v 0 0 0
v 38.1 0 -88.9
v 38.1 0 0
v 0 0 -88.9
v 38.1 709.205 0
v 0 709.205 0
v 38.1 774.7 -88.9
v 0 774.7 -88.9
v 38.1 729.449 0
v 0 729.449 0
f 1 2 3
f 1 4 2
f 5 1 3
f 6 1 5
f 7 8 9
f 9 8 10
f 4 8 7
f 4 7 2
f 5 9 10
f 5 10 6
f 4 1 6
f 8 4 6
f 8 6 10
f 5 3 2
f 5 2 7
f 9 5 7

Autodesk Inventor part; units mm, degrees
ref_plane "YZ Plane" through (0, 0, 0) normal (1, 0, 0) x (0, 1, 0)
ref_plane "XZ Plane" through (0, 0, 0) normal (0, 1, 0) x (-1, 0, 0)
ref_plane "XY Plane" through (0, 0, 0) normal (0, 0, 1) x (1, 0, 0)
sketch "Sketch1" plane through (0, 0, 0) normal (1, 0, 0) x (0, 1, 0)
  line L0 (0, 0) -> (709.2052, 0)
  line L1 (774.7, -88.9) -> (0, -88.9)
  line L2 (0, -88.9) -> (0, 0)
  line L3 (774.7, -88.9) -> (909.5108, -88.9) construction
  line L4 (774.7, -88.9) -> (729.4486, 0)
  line L5 (729.4486, 0) -> (709.2052, 0)
extrude "Extrusion1" add sketch "Sketch1" along normal blind 38.1
properties part number "S_2x4x30.5"
